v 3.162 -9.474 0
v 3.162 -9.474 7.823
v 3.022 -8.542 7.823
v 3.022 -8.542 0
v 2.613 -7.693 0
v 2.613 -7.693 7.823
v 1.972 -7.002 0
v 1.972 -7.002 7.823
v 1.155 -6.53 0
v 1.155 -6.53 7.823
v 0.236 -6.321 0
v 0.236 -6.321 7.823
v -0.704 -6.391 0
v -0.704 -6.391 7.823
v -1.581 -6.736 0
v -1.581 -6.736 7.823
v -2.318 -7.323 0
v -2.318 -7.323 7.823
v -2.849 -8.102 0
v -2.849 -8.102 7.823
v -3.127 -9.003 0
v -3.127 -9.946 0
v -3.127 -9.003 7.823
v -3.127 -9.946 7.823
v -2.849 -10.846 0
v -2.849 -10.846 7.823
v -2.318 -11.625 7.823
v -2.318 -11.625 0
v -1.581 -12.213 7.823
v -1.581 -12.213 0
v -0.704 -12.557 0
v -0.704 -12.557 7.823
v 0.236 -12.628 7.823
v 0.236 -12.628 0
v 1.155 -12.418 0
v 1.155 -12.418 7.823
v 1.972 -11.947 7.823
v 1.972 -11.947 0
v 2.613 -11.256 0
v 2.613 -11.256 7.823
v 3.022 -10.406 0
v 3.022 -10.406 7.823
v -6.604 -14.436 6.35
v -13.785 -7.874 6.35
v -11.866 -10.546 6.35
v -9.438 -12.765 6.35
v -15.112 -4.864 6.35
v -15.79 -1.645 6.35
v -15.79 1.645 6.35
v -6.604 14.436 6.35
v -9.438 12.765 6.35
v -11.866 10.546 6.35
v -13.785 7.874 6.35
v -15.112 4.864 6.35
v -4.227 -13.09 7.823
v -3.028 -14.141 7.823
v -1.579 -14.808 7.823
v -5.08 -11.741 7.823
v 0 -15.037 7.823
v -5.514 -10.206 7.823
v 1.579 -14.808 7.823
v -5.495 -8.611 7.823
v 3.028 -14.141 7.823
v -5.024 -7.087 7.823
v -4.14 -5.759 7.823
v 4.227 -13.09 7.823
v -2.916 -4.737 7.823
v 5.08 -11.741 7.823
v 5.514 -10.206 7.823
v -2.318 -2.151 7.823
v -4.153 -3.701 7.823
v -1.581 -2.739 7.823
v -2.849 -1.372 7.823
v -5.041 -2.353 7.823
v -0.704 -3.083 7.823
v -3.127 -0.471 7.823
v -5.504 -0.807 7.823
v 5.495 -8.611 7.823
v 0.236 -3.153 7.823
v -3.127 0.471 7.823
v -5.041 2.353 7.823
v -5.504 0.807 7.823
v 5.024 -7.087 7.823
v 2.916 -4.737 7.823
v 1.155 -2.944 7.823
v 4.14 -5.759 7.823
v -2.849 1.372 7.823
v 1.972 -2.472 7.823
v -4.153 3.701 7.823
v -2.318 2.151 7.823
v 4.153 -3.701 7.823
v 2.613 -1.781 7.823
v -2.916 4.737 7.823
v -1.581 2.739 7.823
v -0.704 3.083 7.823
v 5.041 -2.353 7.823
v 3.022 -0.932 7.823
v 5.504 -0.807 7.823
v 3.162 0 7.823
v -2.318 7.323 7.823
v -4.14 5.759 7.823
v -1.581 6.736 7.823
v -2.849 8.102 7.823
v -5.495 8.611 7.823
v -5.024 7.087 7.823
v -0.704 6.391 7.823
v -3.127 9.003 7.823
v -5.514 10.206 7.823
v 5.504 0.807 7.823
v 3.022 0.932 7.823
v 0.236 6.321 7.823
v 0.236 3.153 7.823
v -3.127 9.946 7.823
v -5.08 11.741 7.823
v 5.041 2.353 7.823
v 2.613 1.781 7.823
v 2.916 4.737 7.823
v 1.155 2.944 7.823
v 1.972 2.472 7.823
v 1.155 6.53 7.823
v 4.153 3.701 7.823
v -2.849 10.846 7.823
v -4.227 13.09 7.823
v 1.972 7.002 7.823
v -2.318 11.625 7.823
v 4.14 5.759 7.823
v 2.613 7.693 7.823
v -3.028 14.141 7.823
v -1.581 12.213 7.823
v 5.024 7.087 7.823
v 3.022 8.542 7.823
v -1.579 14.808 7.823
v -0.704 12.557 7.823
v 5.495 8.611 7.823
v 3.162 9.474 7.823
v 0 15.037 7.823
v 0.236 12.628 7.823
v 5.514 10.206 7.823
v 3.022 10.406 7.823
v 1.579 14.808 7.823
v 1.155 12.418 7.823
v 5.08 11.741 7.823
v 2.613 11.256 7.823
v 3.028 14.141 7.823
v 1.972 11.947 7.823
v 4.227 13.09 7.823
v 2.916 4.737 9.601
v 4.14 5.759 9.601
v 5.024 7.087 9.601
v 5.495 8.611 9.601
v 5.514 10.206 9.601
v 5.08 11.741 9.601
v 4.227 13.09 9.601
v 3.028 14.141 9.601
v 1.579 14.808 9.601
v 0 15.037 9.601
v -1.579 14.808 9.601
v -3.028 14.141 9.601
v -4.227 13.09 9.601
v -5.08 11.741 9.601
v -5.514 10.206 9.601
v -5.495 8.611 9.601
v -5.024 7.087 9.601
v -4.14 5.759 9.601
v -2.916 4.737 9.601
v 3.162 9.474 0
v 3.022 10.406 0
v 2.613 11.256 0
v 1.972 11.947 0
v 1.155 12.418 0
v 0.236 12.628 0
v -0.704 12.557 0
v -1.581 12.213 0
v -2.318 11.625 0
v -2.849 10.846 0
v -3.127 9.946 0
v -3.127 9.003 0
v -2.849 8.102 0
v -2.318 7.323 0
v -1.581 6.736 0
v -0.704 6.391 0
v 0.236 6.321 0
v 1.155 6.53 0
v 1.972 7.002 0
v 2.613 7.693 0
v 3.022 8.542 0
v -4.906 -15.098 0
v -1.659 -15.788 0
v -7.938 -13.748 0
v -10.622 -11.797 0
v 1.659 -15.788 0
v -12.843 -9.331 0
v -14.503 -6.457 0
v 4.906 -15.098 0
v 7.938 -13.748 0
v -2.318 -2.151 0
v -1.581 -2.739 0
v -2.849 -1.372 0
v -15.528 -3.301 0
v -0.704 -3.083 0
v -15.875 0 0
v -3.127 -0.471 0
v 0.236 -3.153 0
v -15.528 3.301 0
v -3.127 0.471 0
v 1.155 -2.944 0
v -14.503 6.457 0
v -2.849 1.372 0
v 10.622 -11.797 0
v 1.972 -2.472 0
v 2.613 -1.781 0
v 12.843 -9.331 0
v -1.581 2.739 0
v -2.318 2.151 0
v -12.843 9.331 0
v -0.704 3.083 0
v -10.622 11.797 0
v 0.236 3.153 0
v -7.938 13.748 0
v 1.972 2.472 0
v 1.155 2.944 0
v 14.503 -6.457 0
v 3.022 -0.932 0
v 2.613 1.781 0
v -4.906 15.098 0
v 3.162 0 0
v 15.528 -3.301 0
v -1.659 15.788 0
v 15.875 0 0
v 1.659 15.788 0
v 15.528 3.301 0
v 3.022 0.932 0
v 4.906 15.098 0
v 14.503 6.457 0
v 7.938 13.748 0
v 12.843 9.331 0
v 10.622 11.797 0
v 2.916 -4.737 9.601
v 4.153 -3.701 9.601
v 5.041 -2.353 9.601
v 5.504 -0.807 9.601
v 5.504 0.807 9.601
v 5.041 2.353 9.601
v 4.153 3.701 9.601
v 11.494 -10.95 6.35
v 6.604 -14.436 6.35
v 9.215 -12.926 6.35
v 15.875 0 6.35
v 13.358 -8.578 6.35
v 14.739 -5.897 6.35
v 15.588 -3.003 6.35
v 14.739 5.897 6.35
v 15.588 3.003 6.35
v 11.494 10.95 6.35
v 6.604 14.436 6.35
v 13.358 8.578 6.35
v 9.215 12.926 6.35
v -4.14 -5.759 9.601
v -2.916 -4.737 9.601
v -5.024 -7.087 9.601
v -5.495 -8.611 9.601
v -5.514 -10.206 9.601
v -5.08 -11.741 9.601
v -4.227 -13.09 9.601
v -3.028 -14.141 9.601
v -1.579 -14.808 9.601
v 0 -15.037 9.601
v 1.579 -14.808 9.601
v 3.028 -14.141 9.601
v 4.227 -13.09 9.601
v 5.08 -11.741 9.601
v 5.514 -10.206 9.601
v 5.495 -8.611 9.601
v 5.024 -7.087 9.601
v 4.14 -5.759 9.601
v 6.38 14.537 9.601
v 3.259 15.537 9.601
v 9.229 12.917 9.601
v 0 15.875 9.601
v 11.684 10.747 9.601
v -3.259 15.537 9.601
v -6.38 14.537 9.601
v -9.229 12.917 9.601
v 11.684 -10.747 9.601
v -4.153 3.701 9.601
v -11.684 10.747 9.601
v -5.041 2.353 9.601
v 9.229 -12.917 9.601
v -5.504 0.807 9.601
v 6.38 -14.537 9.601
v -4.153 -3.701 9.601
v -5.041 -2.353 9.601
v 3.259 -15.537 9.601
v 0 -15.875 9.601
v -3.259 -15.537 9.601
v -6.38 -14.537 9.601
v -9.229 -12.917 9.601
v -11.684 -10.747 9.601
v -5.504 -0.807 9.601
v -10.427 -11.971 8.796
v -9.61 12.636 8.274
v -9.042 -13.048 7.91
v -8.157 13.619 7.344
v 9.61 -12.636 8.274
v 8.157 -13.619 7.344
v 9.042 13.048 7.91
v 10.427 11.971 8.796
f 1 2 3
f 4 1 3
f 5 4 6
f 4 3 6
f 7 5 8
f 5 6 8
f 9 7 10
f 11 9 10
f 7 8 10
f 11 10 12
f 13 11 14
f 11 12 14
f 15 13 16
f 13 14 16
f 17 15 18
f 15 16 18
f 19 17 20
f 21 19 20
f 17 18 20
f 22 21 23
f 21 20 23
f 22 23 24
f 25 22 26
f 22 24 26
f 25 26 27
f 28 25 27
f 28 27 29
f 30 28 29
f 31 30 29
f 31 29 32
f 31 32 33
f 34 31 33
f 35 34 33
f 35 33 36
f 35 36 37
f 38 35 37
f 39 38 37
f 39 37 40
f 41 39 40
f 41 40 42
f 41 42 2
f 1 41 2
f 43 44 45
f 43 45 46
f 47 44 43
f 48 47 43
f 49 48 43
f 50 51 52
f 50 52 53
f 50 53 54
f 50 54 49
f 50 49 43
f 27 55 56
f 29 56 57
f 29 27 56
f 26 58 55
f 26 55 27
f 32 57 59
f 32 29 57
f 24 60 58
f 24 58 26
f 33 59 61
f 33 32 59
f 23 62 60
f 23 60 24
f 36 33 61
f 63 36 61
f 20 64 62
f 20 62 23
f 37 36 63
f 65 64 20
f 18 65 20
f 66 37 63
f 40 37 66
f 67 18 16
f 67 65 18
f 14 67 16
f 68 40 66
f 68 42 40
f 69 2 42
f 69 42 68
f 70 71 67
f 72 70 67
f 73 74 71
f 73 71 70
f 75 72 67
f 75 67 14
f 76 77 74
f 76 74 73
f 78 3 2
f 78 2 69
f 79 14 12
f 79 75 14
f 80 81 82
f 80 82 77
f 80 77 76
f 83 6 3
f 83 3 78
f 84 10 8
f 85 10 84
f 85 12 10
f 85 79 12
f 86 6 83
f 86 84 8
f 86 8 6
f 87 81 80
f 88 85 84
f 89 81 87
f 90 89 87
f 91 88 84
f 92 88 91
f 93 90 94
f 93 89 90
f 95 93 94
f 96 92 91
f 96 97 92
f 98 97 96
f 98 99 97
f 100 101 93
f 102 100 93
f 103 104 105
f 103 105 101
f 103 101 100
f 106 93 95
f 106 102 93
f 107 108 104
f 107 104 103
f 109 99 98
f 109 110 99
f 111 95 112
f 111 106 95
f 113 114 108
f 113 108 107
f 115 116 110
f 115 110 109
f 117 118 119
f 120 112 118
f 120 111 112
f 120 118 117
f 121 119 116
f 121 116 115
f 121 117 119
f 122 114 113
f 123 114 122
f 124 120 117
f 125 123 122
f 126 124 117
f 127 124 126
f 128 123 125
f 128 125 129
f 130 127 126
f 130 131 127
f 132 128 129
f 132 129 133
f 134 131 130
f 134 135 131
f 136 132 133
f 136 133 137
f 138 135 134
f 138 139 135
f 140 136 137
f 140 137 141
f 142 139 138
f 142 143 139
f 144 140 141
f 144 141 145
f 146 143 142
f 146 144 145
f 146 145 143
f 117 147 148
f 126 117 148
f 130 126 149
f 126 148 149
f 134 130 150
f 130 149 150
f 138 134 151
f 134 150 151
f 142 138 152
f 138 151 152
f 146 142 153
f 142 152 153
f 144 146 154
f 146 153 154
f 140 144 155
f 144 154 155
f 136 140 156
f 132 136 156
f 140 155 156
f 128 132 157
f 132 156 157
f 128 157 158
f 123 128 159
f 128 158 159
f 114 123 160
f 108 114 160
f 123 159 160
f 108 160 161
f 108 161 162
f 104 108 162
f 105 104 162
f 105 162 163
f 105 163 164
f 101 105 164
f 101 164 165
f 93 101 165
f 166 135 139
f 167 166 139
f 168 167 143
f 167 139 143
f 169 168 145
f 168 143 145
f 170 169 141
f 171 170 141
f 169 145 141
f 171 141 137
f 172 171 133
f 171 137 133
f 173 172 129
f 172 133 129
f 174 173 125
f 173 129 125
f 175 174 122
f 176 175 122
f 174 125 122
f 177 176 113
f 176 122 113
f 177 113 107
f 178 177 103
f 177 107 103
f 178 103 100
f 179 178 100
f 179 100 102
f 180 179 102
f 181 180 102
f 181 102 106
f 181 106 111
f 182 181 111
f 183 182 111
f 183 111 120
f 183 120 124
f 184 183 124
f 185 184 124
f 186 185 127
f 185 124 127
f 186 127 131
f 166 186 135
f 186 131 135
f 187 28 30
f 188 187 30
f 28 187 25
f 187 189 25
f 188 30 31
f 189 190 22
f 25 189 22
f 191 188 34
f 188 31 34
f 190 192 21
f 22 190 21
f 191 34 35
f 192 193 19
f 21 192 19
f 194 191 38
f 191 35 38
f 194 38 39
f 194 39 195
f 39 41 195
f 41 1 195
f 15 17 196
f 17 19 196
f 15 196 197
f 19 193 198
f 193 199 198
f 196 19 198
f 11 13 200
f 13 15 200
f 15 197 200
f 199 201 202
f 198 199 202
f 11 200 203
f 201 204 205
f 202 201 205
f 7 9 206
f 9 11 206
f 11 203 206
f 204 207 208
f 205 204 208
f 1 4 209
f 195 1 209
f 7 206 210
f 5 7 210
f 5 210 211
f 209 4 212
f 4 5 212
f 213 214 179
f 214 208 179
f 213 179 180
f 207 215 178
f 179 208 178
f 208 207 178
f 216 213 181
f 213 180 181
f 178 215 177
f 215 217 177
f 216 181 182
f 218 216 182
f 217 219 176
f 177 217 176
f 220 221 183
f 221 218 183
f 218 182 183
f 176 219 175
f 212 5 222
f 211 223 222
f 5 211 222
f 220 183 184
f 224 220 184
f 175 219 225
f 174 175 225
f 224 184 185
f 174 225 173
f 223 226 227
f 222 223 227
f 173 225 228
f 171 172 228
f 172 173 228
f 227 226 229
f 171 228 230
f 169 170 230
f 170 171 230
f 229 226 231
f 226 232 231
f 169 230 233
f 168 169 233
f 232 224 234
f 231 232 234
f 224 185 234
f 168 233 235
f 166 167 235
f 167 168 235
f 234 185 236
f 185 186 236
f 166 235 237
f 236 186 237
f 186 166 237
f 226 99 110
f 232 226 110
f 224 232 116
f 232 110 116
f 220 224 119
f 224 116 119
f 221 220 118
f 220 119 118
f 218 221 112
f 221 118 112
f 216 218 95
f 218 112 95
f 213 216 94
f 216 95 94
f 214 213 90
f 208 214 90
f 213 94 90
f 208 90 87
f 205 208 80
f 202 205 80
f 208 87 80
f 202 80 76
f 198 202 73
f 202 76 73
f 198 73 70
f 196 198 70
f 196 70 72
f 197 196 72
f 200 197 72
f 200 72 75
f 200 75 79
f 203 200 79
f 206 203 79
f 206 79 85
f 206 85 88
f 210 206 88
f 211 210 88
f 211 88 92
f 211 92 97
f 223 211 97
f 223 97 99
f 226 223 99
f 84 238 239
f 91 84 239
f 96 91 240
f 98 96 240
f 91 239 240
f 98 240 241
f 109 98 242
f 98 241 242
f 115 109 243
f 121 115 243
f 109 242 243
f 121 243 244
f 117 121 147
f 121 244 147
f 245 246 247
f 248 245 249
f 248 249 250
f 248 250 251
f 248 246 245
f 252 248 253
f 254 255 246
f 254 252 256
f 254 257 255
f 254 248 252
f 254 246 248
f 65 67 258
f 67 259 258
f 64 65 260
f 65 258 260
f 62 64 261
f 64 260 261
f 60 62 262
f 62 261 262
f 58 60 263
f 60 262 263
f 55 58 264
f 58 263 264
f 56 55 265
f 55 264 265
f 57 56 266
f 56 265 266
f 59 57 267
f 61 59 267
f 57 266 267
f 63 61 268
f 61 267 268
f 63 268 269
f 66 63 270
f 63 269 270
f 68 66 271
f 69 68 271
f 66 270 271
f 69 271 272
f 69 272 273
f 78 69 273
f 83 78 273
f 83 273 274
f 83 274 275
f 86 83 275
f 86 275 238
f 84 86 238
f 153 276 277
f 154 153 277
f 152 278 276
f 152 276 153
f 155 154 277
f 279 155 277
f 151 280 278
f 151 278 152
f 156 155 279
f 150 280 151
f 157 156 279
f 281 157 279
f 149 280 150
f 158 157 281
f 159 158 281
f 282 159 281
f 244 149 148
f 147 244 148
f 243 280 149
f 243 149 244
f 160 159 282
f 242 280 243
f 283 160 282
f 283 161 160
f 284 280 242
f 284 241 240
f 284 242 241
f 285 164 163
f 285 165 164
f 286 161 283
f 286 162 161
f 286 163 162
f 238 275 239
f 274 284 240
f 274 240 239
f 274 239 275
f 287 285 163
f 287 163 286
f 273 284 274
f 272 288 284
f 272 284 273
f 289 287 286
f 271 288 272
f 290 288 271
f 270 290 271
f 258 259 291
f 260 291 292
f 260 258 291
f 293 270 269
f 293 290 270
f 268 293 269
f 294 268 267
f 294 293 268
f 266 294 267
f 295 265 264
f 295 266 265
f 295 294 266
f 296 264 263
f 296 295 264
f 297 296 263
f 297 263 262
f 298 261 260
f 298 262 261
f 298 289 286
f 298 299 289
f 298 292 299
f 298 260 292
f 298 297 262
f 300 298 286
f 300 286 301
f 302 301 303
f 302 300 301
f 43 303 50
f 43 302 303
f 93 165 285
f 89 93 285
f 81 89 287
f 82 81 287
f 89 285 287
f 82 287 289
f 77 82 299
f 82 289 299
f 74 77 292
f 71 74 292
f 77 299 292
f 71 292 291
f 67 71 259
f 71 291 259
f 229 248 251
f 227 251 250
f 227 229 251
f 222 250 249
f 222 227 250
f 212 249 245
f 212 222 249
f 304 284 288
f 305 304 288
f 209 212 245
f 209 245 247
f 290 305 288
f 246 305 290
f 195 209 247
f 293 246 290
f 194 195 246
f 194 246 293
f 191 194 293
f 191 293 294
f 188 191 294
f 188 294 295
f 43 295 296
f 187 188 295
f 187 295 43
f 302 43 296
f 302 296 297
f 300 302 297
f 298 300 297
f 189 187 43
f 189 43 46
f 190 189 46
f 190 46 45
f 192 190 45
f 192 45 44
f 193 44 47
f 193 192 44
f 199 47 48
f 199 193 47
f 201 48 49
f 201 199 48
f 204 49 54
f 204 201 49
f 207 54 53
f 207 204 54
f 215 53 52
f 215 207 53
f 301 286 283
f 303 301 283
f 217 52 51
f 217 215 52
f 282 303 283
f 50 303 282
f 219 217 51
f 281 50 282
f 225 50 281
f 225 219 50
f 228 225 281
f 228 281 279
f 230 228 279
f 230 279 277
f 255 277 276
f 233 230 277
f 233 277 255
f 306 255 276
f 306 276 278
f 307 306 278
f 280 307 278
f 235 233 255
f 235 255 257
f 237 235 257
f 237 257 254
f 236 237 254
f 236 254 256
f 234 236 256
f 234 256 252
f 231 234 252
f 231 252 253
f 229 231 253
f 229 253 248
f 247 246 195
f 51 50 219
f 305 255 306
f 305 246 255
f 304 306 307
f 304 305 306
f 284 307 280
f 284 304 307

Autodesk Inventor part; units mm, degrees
ref_plane "YZ Plane" through (0, 0, 0) normal (1, 0, 0) x (0, 1, 0)
ref_plane "XZ Plane" through (0, 0, 0) normal (0, 1, 0) x (-1, 0, 0)
ref_plane "XY Plane" through (0, 0, 0) normal (0, 0, 1) x (1, 0, 0)
sketch "Sketch1" plane through (0, 0, 0) normal (0, 0, 1) x (1, 0, 0)
  circle A0 centre (0, 0) radius 15.875
  dimension "d0" = 31.75
extrude "Extrusion1" add sketch "Sketch1" along normal blind 6.35
sketch "Sketch2" plane through (0, 0, 0) normal (0, 1, 0) x (-1, 0, 0)
  line L0 (15.875, 6.35) -> (-15.875, 6.35) projected
  line L1 (0, 6.35) -> (-6.604, 6.35)
  line L2 (0, 6.35) -> (6.604, 6.35)
  line L3 (0, 9.6012) -> (-11.684, 9.6012)
  line L4 (0, 9.6012) -> (11.684, 9.6012)
  line L5 (11.684, 9.6012) -> (6.604, 6.35)
  line L6 (-6.604, 6.35) -> (-11.684, 9.6012)
  line L7 (0, 6.35) -> (0, 9.6012)
  point P0 (0, 0)
  dimension "d8" = 13.208
  dimension "d9" = 3.2512
  dimension "d10" = 23.368
  dimension "d29" = 11.684
  dimension "d30" = 6.604
extrude "Extrusion2" add sketch "Sketch2" along normal mid plane 31.75
sketch "Sketch3" plane through (-11.684, 15.875, 9.6012) normal (0, 0, 1) x (1, 0, 0)
  circle A0 centre (11.684, -15.875) radius 15.875
  line L0 (0, -31.75) -> (0, 0) projected
  circle A1 centre (11.684, -15.875) radius 19.7112
extrude "Extrusion3" cut sketch "Sketch3" against normal blind 3.2512 contours A0 L0 A1 | A0 L0 A1
sketch "Sketch4" plane through (0, 0, 6.35) normal (0, 0, 1) x (1, 0, 0)
  circle A0 centre (0, 0) radius 3.1623
  circle A1 centre (0, 9.4742) radius 3.1623
  circle A2 centre (0, -9.4742) radius 3.1623
  dimension "d15" = 6.3246
  dimension "d16" = 6.3246
  dimension "d17" = 6.3246
  dimension "d18" = 9.4742
  dimension "d19" = 9.4742
extrude "Extrusion4" cut sketch "Sketch4" along normal through all both and the other way through all
sketch "Sketch5" plane through (0, 0, 9.6012) normal (0, 0, 1) x (1, 0, 0)
  circle A0 centre (0, 9.4742) radius 3.1623 projected
  arc A1 (2.9159, 4.7371) -> (-2.9159, 4.7371) centre (0, 9.4742) ccw
  circle A2 centre (0, -9.4742) radius 3.1623 projected
  arc A3 (-2.9159, -4.7371) -> (2.9159, -4.7371) centre (0, -9.4742) ccw
  arc A4 (-2.9159, 4.7371) -> (-2.9159, -4.7371) centre (0, 0) ccw
  arc A5 (2.9159, -4.7371) -> (2.9159, 4.7371) centre (0, 0) ccw
  dimension "d23" = 11.1252
  dimension "d24" = 11.1252
extrude "Extrusion5" cut sketch "Sketch5" against normal blind 1.778
properties part number "hockey puck"
